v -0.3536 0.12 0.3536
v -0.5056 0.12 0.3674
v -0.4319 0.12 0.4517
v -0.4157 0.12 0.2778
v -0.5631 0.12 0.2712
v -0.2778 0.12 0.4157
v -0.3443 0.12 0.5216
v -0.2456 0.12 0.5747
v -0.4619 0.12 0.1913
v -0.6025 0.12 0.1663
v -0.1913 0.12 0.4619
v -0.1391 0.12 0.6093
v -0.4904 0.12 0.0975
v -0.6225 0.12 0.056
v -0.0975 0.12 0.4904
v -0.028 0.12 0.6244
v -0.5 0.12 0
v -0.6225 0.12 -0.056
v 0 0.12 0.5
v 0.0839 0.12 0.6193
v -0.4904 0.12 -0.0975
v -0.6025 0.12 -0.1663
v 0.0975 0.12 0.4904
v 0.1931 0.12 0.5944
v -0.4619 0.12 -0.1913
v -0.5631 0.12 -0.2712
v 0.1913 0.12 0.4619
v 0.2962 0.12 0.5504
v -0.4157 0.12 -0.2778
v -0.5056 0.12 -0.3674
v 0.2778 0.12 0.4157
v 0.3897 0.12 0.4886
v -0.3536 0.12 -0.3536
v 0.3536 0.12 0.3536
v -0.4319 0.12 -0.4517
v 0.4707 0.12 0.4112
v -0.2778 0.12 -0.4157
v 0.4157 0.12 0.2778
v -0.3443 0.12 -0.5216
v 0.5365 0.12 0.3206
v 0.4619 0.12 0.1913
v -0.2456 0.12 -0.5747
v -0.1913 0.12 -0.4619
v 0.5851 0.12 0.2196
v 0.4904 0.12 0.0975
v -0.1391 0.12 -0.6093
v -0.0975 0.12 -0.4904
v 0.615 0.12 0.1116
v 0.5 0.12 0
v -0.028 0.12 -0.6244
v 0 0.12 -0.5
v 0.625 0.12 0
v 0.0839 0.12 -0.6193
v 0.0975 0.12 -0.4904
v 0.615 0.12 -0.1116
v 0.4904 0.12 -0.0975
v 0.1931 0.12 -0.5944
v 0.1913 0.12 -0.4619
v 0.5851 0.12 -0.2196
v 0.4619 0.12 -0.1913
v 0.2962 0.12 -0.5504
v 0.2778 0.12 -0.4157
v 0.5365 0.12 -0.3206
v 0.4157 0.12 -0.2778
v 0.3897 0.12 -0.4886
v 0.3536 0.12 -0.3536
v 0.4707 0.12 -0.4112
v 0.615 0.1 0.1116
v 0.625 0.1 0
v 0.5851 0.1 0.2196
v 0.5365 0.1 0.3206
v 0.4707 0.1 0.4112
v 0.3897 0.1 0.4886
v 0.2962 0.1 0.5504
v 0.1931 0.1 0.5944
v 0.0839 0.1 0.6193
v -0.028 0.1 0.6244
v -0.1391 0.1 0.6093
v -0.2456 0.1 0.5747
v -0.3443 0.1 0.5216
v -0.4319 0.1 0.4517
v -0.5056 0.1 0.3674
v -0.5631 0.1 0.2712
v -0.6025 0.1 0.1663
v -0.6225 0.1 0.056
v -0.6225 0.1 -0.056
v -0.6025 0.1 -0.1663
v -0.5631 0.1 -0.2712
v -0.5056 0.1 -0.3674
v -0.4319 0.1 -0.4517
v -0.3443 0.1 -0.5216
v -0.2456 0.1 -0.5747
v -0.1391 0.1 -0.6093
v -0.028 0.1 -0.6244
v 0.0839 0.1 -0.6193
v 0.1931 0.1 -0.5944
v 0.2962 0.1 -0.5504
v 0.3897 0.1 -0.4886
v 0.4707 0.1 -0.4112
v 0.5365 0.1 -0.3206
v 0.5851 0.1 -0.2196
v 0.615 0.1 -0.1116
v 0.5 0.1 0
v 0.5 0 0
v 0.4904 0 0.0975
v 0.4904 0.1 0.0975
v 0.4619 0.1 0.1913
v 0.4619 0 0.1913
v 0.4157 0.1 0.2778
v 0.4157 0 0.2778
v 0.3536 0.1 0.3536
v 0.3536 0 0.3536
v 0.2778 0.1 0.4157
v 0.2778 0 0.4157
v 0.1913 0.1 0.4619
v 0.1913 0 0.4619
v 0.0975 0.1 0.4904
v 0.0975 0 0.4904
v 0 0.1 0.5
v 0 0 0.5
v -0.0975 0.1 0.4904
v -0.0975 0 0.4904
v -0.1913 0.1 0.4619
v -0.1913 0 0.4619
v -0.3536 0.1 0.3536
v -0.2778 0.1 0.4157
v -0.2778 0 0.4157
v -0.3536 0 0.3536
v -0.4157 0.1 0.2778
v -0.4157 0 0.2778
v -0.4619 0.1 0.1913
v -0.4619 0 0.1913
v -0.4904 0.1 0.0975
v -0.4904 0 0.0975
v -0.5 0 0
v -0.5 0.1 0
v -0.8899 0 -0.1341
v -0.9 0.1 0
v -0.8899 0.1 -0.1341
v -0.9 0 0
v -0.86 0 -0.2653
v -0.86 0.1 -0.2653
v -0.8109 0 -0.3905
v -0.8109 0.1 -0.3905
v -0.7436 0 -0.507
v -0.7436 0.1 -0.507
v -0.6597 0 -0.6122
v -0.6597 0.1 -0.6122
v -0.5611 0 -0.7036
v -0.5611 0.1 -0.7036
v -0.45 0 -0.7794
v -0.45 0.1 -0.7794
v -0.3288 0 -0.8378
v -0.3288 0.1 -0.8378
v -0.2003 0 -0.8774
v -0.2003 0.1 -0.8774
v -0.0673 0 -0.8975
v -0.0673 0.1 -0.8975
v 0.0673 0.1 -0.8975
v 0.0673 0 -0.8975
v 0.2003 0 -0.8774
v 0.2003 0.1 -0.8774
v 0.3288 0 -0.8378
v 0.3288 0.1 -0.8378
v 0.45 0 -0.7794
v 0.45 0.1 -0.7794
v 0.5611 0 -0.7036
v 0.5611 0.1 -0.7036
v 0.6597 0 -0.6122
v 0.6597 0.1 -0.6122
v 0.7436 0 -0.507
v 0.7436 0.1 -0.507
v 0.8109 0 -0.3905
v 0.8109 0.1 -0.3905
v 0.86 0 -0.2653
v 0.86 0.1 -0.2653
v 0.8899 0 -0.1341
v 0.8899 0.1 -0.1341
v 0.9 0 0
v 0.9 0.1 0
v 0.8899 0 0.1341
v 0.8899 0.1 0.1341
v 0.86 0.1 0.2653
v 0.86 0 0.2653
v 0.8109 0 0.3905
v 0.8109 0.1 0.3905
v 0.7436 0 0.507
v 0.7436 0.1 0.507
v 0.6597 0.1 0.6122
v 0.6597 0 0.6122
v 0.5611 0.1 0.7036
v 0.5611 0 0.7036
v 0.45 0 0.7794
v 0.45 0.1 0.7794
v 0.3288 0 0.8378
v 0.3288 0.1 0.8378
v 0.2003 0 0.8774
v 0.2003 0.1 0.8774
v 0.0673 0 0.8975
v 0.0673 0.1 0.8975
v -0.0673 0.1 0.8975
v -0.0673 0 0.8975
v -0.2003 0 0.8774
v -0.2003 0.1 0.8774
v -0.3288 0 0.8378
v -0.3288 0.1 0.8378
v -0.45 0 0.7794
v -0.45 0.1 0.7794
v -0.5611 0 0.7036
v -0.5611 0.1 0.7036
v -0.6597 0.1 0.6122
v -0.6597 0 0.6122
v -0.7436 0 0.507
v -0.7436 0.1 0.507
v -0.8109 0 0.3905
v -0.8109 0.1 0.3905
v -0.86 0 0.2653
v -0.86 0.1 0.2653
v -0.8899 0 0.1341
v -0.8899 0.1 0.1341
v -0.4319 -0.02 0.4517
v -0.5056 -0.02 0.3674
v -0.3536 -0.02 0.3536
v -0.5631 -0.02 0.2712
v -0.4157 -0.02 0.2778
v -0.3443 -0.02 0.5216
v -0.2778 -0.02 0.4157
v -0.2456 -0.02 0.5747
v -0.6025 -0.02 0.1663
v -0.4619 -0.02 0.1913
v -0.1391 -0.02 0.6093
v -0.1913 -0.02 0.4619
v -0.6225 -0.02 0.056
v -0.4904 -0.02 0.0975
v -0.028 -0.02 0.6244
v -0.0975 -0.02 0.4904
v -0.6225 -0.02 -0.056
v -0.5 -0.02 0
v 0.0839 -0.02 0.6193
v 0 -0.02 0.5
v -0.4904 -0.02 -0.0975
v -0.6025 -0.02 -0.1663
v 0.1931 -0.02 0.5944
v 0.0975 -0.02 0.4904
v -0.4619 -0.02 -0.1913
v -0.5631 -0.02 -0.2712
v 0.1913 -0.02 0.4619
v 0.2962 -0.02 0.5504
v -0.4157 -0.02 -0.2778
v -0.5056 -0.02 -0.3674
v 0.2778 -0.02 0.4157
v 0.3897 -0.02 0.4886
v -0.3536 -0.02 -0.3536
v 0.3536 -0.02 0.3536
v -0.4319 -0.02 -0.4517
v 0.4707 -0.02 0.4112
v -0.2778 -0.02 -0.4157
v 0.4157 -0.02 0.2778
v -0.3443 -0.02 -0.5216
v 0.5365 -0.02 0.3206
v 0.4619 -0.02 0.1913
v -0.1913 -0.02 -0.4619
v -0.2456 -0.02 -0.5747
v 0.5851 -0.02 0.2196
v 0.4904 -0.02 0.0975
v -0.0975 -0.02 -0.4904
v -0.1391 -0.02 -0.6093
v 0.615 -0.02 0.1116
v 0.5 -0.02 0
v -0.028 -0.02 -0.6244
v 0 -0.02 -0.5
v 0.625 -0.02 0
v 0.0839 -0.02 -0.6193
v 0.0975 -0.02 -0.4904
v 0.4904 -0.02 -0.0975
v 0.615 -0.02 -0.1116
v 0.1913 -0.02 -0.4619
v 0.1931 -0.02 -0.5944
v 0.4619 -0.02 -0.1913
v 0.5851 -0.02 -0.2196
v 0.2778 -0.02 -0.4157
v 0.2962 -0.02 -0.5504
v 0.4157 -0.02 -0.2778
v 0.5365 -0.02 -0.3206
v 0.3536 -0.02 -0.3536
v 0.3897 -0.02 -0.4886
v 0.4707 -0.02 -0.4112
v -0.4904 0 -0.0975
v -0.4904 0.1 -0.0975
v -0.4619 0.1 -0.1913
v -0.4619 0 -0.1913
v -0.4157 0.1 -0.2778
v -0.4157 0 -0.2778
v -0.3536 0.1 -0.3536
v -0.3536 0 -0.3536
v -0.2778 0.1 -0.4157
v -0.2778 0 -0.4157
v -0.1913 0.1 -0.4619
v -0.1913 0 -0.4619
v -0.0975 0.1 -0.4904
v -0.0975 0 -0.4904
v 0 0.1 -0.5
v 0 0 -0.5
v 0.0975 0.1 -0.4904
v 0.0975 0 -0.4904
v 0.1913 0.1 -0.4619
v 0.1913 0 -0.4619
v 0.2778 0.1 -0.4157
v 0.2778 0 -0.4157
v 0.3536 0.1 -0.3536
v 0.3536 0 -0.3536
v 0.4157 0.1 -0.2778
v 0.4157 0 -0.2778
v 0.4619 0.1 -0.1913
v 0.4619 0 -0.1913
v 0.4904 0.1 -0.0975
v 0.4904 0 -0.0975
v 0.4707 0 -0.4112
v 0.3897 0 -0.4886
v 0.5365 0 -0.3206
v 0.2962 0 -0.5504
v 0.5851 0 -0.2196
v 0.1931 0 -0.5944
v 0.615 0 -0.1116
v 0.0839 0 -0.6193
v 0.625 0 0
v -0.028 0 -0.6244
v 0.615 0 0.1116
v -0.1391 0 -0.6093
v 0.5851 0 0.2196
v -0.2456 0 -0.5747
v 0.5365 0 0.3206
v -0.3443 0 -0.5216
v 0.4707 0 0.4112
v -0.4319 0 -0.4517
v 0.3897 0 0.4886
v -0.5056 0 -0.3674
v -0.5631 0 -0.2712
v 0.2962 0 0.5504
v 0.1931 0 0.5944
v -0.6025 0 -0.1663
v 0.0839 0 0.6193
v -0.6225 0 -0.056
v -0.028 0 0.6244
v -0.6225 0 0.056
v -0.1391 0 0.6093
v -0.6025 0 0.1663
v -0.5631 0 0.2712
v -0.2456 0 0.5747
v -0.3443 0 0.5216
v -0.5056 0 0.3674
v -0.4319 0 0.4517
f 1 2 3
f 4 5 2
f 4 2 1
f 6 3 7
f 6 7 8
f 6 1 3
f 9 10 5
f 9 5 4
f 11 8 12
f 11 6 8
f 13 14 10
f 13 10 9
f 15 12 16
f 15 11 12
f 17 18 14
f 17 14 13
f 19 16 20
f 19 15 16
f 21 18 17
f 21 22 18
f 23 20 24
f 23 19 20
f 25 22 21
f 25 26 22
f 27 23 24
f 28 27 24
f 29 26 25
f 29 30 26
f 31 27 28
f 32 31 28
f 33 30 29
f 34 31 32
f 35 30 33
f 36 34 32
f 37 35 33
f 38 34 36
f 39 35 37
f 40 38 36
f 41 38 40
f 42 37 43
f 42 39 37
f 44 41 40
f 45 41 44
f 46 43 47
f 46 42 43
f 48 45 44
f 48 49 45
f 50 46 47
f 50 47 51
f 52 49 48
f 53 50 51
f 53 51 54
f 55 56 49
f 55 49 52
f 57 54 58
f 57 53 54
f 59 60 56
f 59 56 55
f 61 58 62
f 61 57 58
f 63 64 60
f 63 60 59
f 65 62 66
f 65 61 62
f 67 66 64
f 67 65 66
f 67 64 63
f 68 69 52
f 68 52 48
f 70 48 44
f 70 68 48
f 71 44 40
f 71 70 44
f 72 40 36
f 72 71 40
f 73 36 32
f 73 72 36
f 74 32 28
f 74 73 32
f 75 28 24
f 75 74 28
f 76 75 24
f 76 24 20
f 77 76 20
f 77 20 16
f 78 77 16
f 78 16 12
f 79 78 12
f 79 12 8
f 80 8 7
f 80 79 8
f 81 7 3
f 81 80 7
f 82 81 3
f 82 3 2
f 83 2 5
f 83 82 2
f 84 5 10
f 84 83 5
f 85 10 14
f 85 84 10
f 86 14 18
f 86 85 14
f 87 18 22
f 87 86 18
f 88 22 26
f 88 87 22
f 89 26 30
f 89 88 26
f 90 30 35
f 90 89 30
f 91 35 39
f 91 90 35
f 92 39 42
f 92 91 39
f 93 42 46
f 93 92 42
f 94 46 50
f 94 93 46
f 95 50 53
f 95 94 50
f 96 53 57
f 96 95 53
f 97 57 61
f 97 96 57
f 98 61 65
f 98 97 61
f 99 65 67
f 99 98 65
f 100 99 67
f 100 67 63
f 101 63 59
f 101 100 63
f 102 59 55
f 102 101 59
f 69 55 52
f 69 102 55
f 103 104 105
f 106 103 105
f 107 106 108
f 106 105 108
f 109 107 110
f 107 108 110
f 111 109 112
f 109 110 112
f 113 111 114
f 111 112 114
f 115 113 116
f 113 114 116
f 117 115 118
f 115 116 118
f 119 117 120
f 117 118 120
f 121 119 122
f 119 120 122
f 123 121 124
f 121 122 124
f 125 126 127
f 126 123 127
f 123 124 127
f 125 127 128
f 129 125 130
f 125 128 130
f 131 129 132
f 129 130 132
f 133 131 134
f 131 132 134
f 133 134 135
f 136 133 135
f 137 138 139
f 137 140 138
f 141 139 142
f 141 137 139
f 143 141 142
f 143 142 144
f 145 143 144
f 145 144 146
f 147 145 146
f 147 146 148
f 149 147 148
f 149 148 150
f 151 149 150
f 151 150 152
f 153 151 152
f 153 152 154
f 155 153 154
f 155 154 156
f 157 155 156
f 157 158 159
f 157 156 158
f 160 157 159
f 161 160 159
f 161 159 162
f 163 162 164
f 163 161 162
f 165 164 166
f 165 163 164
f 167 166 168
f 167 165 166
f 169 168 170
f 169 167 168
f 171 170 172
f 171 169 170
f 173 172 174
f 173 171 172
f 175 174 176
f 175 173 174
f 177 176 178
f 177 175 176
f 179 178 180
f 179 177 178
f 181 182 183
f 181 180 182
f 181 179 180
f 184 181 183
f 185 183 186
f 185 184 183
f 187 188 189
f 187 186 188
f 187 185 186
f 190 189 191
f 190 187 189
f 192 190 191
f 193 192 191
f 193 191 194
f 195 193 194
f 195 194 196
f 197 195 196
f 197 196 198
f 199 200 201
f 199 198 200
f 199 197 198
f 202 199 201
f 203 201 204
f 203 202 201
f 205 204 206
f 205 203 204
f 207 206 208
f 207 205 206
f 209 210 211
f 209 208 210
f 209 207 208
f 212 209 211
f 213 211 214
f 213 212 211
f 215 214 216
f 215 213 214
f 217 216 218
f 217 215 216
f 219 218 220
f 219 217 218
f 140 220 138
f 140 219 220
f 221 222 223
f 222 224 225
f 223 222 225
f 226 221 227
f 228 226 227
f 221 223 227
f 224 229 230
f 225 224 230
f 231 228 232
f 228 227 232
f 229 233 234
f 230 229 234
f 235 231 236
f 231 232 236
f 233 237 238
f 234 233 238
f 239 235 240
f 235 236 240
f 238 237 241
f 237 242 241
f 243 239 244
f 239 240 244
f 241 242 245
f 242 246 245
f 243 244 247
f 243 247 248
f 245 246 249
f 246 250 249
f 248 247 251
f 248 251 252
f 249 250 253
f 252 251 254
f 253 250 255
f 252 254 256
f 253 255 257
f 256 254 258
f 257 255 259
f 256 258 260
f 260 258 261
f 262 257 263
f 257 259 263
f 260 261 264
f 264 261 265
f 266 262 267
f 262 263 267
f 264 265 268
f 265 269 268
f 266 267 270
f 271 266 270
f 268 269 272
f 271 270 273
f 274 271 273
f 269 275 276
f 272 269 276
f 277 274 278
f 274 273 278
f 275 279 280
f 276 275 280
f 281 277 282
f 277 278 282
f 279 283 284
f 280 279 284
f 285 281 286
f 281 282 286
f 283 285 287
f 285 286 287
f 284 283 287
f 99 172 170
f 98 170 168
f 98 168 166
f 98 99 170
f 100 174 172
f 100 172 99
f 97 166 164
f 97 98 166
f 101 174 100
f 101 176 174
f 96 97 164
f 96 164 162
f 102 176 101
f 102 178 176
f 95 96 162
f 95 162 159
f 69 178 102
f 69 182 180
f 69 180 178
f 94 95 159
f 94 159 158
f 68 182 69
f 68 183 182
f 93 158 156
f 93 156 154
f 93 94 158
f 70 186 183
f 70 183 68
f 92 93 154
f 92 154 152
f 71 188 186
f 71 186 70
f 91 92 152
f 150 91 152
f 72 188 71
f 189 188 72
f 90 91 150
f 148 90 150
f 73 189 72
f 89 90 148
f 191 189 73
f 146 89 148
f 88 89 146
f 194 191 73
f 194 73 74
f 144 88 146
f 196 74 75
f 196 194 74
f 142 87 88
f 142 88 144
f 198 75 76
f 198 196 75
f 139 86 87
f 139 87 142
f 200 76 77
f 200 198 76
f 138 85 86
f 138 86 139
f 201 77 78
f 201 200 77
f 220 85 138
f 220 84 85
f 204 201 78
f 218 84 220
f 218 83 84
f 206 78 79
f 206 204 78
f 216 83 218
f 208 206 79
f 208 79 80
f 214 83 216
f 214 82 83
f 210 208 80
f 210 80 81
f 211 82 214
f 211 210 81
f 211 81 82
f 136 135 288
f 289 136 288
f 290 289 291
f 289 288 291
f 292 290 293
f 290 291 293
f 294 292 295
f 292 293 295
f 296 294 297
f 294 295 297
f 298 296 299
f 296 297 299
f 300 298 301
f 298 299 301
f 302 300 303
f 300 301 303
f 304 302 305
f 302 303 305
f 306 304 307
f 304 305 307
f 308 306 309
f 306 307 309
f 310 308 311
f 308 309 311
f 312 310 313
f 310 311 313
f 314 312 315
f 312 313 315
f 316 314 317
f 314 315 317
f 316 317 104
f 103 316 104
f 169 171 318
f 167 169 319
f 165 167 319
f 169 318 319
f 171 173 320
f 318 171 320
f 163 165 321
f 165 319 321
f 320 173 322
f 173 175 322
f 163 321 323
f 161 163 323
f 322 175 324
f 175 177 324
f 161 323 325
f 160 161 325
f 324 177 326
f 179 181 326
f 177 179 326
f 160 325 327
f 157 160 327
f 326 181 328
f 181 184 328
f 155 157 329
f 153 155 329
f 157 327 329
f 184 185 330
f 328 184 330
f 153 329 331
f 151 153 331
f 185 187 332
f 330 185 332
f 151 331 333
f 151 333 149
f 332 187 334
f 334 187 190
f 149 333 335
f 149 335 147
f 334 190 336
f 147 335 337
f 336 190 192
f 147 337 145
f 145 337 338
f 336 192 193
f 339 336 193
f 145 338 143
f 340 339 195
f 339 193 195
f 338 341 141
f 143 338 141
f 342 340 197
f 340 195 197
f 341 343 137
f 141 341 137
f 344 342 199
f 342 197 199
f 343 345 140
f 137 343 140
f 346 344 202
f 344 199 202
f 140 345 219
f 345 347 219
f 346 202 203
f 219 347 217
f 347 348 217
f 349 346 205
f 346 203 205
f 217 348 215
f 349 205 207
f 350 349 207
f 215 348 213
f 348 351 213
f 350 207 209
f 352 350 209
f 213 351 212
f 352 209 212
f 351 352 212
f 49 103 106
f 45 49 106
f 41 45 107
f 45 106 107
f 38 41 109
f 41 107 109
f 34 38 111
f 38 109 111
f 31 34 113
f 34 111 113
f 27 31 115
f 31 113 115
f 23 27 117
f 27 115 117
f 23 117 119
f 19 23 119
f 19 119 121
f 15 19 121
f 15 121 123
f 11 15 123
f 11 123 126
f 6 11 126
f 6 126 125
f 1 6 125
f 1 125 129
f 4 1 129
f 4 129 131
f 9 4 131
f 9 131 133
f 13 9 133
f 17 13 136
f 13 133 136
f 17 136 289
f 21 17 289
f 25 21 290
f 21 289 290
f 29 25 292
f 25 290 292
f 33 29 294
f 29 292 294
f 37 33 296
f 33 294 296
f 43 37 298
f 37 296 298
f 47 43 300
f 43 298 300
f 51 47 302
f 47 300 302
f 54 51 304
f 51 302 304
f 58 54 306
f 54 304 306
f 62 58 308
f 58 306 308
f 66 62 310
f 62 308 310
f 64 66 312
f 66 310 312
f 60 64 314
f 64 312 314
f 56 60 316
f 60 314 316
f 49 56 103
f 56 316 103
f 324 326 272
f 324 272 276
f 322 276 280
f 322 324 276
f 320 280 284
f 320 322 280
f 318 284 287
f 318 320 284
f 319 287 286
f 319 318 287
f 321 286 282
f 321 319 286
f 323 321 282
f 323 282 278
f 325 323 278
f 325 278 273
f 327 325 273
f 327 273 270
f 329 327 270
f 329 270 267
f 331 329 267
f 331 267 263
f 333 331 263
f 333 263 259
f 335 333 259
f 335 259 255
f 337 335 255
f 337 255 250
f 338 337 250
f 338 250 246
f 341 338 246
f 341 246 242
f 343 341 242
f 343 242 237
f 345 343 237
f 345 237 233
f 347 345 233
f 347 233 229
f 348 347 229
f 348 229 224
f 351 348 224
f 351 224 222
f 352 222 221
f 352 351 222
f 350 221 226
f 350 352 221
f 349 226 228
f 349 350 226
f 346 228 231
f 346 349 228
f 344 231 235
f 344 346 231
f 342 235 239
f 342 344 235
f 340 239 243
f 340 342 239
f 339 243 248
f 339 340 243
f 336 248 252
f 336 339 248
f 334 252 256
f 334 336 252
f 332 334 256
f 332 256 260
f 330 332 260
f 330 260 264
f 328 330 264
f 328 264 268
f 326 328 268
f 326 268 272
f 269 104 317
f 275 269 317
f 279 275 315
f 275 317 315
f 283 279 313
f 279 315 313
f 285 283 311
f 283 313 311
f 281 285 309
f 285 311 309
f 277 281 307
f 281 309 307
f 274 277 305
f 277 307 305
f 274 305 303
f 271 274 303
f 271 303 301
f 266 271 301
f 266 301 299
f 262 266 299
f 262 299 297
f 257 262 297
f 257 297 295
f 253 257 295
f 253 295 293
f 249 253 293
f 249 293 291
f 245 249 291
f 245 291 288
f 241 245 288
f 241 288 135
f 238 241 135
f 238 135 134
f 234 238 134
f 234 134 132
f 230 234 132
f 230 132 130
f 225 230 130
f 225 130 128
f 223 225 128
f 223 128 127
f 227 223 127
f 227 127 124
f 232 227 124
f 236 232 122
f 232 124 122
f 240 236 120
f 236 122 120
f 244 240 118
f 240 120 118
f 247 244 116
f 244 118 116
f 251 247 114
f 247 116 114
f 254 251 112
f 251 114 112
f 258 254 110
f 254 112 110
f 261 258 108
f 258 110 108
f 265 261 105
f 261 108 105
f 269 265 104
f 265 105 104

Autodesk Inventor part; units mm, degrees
ref_plane "YZ Plane" through (0, 0, 0) normal (1, 0, 0) x (0, 1, 0)
ref_plane "XZ Plane" through (0, 0, 0) normal (0, 1, 0) x (-1, 0, 0)
ref_plane "XY Plane" through (0, 0, 0) normal (0, 0, 1) x (1, 0, 0)
sketch "Esboço1" plane through (0, 0, 0) normal (0, 1, 0) x (-1, 0, 0)
  circle A0 centre (0, 0) radius 0.9
  circle A1 centre (0, 0) radius 0.5
  dimension "d0" = 1.8
  dimension "d1" = 1
extrude "Extrusão1" add sketch "Esboço1" along normal blind 0.1
sketch "Esboço2" plane through (0, 0.1, 0) normal (0, 1, 0) x (1, 0, 0)
  circle A0 centre (0, 0) radius 0.625
  circle A1 centre (0, 0) radius 0.5 projected
  dimension "d4" = 1.25
extrude "Extrusão2" add sketch "Esboço2" along normal blind 0.02 and the other way blind 0.12
properties part number "Apoio Contato" material "Plástico SAN"
